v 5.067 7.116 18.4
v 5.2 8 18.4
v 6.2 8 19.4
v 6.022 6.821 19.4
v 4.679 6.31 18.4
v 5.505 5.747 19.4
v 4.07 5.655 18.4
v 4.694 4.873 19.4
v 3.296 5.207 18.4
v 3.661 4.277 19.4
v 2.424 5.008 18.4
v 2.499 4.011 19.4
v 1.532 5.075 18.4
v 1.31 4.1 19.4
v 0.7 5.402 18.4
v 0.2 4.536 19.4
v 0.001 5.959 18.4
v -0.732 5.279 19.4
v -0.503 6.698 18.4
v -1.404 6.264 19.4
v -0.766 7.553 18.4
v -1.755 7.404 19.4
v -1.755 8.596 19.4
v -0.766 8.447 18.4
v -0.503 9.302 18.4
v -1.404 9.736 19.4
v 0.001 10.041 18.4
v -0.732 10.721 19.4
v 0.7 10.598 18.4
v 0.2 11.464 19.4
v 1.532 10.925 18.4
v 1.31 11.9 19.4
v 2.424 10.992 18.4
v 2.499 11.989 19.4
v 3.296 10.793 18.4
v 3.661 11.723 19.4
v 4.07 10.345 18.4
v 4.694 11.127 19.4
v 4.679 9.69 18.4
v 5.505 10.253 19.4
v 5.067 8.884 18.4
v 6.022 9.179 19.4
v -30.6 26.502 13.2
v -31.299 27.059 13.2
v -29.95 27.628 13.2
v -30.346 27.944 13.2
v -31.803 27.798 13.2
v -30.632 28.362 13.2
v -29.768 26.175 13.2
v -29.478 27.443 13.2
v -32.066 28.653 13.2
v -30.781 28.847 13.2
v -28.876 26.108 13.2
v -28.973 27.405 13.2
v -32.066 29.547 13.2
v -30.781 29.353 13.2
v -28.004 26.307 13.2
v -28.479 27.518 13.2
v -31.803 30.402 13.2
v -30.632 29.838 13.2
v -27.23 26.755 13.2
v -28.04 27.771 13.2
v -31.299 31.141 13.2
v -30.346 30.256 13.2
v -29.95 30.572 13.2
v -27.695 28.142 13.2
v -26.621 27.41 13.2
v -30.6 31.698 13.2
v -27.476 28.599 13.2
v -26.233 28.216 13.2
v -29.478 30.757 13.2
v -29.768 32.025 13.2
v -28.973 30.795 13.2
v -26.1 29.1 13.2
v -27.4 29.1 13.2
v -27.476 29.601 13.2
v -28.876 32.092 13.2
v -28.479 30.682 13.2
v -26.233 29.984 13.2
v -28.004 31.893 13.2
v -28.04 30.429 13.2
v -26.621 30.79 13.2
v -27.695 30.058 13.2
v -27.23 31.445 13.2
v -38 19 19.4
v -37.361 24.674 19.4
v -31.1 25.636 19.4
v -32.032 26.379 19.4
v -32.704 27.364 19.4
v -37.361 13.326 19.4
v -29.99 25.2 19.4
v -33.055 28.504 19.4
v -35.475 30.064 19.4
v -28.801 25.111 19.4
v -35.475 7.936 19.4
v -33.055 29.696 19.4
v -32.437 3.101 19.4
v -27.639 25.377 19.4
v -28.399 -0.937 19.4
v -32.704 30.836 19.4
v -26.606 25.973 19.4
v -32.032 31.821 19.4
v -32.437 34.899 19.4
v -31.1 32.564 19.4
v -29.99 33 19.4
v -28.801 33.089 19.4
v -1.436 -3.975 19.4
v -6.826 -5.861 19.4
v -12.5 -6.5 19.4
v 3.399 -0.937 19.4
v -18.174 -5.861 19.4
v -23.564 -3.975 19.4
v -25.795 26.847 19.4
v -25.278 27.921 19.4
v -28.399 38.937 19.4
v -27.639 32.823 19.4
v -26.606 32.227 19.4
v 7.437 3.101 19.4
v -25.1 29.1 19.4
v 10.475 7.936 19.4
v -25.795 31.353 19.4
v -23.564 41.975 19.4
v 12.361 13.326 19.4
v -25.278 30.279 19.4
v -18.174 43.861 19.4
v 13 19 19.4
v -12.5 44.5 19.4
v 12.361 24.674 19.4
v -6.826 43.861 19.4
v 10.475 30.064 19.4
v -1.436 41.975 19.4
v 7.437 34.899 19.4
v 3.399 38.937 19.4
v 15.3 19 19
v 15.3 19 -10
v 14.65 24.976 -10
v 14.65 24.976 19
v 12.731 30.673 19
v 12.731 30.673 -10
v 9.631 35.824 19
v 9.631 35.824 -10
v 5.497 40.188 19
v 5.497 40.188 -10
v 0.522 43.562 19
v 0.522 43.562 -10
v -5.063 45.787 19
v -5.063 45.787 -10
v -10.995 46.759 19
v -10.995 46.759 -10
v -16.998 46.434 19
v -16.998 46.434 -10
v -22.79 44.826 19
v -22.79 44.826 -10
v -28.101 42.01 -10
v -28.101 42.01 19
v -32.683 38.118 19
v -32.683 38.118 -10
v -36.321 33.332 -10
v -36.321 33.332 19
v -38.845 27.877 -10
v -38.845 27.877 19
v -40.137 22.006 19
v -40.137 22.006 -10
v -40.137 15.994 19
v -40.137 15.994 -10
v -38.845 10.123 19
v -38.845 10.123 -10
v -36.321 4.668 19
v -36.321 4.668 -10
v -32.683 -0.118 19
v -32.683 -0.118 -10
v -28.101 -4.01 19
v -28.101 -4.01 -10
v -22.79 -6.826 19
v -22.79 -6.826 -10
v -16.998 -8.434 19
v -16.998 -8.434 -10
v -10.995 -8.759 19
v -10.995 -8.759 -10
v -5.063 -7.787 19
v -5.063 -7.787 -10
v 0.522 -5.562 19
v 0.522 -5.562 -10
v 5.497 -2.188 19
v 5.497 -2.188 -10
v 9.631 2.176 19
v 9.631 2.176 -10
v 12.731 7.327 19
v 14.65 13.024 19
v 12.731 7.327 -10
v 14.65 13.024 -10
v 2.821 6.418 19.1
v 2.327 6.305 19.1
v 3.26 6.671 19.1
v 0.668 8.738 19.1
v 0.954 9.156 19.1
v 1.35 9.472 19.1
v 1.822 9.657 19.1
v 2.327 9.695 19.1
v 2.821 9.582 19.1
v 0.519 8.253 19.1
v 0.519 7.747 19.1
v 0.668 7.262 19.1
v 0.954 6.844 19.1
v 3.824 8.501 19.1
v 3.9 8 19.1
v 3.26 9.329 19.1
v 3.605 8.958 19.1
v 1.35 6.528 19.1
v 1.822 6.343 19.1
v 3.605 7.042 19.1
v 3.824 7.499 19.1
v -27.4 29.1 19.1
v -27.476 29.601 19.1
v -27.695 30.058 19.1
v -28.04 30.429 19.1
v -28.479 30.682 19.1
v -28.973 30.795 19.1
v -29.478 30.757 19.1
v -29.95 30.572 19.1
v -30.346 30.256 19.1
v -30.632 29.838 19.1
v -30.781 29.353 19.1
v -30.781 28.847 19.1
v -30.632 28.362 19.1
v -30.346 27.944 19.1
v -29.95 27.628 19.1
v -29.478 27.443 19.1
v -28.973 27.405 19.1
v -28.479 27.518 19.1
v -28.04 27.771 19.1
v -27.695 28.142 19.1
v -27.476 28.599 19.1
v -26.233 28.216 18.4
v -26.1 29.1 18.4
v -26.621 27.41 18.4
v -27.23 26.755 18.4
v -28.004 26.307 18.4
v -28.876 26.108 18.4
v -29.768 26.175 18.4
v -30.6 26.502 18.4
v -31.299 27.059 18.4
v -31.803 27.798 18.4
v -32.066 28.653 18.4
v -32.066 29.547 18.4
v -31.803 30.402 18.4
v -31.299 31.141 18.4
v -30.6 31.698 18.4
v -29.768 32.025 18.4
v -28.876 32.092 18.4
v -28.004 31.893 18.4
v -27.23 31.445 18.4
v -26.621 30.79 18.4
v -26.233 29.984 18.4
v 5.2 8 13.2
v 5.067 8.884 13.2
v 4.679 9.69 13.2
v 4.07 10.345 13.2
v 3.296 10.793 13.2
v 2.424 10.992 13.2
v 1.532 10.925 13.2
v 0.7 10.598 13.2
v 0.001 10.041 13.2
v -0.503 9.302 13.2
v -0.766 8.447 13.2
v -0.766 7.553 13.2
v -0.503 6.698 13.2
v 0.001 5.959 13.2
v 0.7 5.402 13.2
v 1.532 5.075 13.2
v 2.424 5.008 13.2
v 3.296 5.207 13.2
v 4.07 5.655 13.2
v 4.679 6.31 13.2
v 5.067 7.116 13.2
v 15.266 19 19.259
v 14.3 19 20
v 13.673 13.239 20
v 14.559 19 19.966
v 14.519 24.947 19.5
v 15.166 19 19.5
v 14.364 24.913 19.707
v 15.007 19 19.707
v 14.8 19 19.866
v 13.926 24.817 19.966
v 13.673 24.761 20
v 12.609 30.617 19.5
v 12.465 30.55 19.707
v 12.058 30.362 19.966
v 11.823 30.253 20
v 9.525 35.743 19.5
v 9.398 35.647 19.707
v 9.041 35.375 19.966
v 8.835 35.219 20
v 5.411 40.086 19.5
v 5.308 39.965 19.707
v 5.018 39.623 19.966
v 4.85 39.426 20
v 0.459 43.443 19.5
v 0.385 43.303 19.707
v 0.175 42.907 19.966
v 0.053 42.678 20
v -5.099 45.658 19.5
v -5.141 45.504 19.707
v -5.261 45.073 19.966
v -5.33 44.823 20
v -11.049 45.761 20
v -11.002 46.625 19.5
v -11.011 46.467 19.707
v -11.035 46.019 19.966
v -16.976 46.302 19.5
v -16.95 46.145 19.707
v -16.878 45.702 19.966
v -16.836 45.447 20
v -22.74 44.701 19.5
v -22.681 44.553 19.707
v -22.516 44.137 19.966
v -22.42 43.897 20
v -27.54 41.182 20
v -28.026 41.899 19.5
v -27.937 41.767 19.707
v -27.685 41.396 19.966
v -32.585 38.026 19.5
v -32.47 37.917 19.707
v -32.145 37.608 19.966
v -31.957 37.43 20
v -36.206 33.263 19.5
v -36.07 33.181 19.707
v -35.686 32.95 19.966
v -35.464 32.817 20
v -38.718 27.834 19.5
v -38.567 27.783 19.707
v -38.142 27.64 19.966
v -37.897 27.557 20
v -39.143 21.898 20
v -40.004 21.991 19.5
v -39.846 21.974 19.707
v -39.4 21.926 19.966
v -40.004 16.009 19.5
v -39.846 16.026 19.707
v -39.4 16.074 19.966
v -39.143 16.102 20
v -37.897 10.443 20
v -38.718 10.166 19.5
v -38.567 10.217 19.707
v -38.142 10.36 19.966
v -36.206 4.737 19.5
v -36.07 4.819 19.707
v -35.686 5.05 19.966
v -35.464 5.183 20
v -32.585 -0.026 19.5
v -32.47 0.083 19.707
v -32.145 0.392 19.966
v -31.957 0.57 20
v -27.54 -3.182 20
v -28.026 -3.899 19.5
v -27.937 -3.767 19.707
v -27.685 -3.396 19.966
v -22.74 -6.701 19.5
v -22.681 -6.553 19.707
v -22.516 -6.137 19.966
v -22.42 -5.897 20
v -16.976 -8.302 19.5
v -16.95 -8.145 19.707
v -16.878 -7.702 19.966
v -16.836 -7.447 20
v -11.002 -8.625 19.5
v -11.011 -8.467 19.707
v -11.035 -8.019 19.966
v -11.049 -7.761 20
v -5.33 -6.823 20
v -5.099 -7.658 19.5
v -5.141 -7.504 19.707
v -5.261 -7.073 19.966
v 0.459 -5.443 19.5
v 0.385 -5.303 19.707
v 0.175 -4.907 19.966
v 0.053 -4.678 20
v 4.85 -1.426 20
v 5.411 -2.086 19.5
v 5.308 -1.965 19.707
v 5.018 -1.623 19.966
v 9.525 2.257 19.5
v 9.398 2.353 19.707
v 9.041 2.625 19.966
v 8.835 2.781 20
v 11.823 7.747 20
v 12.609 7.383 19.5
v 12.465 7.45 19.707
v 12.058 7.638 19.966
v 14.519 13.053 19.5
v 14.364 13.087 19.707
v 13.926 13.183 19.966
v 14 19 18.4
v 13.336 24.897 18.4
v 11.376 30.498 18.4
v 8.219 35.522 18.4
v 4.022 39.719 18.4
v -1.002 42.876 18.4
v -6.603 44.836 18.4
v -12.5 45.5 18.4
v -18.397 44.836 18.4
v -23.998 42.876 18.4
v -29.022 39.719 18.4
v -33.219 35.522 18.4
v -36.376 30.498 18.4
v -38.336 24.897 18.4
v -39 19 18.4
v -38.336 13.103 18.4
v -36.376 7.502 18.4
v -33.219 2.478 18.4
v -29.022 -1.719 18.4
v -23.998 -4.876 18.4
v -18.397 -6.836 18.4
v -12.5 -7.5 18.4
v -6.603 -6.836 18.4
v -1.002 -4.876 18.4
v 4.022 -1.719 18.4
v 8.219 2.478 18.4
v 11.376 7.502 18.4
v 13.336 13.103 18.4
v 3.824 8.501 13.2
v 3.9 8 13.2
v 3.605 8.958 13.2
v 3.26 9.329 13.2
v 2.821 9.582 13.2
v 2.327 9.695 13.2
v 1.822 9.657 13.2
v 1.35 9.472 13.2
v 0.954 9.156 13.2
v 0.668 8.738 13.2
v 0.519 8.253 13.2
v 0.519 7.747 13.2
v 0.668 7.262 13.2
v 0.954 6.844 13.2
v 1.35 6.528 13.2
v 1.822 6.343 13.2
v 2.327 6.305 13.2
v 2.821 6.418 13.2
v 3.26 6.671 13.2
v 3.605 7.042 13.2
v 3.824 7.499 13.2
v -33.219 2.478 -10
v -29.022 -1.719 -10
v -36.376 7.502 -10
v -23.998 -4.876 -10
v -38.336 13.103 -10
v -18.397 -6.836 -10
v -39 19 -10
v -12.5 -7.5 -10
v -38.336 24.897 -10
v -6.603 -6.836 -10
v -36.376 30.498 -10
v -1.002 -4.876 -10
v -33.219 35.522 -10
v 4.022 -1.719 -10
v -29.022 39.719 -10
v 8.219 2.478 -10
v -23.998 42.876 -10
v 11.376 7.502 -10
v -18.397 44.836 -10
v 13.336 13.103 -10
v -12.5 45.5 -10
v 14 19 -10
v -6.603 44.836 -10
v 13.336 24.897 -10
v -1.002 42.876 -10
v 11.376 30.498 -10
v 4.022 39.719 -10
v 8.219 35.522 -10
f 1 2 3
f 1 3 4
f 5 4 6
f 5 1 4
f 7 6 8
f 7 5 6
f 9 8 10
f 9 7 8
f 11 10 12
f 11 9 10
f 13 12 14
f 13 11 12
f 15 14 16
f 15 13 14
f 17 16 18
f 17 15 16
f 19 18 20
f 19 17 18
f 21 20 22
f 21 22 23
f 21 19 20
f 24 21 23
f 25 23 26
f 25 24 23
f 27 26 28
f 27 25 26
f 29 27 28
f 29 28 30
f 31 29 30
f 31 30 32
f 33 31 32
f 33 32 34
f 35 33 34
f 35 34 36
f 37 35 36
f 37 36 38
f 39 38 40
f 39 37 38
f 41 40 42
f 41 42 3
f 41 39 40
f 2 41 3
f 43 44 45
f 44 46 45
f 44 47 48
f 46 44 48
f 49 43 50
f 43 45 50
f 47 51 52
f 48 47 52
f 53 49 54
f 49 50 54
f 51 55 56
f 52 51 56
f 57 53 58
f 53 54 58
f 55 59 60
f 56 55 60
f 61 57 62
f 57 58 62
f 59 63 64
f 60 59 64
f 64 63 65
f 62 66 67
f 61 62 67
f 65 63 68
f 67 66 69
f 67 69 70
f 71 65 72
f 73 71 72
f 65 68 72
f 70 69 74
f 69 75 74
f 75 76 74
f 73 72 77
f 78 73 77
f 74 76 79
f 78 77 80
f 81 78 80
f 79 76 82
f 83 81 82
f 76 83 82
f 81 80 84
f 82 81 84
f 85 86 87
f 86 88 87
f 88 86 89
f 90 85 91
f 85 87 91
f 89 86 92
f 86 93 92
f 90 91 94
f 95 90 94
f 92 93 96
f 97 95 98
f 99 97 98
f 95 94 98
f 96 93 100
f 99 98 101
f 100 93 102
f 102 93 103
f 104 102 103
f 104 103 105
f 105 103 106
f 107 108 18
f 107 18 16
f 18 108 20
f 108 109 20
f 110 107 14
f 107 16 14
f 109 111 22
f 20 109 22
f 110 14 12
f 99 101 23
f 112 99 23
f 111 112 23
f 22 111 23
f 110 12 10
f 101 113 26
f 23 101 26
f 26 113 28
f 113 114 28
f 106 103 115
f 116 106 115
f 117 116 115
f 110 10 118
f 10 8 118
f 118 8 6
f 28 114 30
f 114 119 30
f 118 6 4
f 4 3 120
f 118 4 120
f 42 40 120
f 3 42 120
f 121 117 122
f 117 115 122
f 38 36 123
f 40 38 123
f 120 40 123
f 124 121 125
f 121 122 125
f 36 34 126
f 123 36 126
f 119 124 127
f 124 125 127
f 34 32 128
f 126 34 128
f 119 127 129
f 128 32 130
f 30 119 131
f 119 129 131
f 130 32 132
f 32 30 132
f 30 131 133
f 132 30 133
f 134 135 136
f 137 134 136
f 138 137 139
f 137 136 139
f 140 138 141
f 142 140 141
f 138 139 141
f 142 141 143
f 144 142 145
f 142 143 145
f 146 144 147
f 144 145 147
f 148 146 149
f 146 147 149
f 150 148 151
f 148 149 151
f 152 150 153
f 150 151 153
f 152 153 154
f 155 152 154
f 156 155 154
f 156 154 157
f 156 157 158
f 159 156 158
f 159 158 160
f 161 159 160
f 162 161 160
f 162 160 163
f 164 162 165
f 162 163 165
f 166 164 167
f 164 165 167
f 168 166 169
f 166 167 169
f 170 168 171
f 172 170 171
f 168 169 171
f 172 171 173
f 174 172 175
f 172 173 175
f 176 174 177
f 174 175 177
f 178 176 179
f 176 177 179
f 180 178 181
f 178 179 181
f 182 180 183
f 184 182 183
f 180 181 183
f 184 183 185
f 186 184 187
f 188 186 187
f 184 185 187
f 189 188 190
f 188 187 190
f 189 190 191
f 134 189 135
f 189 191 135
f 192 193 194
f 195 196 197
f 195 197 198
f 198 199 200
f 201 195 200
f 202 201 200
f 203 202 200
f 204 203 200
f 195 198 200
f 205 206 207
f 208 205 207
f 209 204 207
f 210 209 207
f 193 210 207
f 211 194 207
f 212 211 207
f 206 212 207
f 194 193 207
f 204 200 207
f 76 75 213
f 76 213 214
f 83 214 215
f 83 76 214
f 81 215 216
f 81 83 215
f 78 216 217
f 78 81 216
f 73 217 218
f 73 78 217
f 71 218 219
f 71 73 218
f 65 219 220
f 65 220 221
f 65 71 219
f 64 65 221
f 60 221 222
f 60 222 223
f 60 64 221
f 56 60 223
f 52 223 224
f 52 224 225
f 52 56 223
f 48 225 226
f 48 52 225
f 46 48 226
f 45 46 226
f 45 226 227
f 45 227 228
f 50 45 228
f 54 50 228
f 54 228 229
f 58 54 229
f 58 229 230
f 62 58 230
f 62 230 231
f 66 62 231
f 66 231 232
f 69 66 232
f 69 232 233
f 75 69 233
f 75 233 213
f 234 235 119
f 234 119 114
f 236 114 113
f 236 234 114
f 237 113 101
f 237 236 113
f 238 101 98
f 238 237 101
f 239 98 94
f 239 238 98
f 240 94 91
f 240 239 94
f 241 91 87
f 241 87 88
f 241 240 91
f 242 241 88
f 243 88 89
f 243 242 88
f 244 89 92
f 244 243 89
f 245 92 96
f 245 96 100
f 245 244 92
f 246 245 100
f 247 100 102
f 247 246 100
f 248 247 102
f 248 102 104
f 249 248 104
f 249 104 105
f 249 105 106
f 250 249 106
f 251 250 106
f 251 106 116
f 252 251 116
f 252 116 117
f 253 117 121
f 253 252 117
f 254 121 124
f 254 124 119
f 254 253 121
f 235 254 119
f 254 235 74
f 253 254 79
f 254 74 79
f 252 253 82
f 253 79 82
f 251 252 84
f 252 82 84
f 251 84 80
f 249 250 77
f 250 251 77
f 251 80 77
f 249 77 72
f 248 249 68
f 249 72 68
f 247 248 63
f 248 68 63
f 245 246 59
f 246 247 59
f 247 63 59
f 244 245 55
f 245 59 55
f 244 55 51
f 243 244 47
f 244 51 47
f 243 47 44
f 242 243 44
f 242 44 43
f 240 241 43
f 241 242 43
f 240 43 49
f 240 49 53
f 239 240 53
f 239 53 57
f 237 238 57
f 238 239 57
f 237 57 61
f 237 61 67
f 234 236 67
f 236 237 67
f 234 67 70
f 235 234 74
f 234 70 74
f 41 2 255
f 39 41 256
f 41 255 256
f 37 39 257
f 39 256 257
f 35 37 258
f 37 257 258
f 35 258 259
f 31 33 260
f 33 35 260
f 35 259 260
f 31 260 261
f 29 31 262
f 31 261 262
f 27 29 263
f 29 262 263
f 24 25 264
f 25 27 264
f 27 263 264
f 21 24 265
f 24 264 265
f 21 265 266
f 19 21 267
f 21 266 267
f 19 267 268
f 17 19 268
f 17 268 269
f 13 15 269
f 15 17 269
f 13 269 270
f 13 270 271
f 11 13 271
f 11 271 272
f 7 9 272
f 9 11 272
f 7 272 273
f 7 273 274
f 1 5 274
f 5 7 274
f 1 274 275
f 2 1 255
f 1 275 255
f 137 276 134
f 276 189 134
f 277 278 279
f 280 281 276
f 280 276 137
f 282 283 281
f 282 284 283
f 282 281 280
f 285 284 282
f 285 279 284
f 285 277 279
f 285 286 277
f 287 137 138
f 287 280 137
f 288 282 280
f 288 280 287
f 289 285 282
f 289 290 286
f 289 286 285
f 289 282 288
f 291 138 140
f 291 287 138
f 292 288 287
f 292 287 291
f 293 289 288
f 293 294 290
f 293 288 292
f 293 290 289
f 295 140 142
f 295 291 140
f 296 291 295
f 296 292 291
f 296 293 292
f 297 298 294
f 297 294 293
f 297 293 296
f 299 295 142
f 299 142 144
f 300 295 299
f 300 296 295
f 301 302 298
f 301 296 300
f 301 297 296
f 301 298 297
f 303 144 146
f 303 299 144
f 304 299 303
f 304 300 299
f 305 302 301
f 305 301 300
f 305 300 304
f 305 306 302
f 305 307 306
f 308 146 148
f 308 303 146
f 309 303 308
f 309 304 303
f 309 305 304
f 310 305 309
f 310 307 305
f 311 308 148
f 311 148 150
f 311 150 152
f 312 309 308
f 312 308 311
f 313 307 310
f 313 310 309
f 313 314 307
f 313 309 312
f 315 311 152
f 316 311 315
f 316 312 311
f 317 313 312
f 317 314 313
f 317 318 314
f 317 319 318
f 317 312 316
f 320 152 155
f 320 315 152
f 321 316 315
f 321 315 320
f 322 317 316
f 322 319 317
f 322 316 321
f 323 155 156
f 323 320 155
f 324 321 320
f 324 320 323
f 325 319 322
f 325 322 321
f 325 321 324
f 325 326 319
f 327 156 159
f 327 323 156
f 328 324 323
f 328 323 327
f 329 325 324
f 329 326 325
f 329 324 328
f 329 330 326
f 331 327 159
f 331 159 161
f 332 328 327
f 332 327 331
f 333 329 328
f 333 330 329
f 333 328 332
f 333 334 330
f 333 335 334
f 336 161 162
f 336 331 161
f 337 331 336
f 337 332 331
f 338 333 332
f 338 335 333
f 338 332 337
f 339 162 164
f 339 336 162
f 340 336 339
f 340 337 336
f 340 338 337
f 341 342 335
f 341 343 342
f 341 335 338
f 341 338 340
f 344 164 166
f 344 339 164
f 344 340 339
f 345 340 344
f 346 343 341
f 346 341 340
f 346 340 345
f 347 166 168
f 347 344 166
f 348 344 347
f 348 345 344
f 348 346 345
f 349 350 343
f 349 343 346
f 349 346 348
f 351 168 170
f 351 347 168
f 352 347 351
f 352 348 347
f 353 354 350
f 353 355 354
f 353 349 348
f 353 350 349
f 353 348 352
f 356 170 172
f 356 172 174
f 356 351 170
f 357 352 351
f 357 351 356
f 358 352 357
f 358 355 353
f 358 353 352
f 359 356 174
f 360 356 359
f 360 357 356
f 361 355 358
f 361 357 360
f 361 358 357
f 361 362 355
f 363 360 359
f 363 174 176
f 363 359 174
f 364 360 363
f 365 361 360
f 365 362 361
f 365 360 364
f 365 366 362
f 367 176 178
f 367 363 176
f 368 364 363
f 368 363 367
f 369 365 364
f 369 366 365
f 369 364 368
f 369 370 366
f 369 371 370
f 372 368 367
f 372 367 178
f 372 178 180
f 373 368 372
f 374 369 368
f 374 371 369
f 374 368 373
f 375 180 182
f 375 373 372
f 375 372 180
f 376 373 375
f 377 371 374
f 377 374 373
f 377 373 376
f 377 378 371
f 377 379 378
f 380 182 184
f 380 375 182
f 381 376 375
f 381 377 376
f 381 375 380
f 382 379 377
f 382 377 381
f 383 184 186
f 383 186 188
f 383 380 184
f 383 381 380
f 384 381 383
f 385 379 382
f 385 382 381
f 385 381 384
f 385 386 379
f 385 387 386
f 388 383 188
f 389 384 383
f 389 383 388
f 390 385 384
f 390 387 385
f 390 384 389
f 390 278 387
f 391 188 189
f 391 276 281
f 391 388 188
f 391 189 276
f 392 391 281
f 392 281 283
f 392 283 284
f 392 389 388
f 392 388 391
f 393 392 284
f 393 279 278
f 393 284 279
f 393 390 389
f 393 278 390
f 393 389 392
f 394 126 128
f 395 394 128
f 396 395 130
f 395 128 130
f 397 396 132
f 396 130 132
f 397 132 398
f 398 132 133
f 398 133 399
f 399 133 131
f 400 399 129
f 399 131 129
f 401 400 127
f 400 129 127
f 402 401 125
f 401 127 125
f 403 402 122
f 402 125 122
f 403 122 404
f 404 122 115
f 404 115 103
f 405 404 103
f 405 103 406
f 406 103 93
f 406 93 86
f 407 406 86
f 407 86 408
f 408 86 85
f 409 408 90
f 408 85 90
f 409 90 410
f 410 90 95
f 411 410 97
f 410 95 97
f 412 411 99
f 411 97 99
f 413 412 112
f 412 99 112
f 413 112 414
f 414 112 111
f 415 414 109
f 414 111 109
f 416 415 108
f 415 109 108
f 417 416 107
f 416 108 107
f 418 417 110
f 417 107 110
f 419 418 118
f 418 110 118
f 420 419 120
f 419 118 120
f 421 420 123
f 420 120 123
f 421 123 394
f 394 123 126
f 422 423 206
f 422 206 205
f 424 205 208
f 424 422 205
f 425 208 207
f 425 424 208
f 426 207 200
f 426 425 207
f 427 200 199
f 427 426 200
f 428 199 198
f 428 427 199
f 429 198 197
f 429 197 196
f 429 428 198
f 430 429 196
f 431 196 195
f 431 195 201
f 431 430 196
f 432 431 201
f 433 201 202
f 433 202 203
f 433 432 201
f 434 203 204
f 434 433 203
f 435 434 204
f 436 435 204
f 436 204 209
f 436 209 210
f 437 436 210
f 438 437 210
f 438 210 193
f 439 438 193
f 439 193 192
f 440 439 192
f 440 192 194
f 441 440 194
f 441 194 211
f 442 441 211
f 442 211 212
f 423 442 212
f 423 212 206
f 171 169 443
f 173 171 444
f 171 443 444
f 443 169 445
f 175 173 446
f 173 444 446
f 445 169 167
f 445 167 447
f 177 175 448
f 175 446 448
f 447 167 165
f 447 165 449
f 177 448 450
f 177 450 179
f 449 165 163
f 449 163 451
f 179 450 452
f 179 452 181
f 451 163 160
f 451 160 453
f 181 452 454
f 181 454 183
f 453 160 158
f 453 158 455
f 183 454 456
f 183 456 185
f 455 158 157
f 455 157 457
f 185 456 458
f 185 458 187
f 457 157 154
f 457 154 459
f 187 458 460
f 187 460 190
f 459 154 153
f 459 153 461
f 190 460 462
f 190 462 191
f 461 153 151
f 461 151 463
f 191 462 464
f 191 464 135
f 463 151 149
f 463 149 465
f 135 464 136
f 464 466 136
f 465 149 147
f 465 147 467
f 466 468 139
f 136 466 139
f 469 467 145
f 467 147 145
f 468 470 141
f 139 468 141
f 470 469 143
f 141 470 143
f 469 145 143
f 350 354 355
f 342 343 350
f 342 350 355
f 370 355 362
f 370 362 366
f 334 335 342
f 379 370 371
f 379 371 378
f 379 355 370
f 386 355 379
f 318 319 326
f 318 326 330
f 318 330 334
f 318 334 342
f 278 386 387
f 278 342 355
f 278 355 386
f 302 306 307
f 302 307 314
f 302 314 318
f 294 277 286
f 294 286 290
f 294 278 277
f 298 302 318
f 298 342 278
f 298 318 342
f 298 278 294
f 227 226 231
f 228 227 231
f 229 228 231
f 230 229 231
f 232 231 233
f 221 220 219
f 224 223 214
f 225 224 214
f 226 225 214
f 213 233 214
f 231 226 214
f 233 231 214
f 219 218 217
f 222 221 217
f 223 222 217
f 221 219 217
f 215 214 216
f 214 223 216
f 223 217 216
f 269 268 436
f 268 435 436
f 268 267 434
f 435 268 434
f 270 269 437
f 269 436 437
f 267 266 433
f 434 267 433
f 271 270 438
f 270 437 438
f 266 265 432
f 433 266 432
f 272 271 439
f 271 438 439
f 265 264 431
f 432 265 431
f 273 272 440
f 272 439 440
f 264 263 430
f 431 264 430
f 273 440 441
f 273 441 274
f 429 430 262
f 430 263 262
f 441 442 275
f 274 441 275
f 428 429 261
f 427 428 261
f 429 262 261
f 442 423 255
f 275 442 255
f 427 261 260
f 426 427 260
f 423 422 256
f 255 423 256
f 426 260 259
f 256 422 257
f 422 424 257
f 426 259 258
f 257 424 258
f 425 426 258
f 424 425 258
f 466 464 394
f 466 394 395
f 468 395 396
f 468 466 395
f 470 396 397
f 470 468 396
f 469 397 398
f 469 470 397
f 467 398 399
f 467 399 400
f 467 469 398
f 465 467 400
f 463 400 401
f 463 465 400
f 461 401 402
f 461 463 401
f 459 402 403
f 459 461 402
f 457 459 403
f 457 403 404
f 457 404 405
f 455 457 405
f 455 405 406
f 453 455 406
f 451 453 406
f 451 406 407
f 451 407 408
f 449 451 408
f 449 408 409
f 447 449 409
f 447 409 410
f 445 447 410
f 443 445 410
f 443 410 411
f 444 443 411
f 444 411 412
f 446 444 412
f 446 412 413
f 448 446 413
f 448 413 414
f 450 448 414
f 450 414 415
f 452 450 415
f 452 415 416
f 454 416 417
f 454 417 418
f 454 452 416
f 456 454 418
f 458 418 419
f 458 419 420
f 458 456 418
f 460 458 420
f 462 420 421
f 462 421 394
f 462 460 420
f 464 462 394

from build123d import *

# Parameters (mm, degrees)
CYLINDER004_R     = 1.7
CYLINDER004_DEPTH = 6.5
CYLINDER002_R     = 3
CYLINDER002_DEPTH = 6.5
CYLINDER_R        = 26.5
CYLINDER_DEPTH    = 30
CYLINDER001_R     = 27.8
CYLINDER001_DEPTH = 30
CYLINDER005_R     = 1.7
CYLINDER005_DEPTH = 6.5
CYLINDER003_R     = 3
CYLINDER003_DEPTH = 6.5
CHAMFER_SIZE      = 1
FILLET_R          = 1


with BuildPart() as vaciado_tope1:
    # Cylinder004 → Cylinder004 (new body)
    with BuildSketch(Plane(origin=(2.2, 8, -3.4), x_dir=(1, 0, 0), z_dir=(0, 0, 1))):
        Circle(CYLINDER004_R)
    extrude(amount=CYLINDER004_DEPTH)


with BuildPart() as cut001:
    # Cylinder002 → Cylinder002 (new body)
    with BuildSketch(Plane(origin=(2.2, 8, -2.8), x_dir=(1, 0, 0), z_dir=(0, 0, 1))):
        Circle(CYLINDER002_R)
    extrude(amount=CYLINDER002_DEPTH)

    # Cut001: cut vaciado tope1
    add(vaciado_tope1.part, mode=Mode.SUBTRACT)


with BuildPart() as cut001_1:
    # Cut001 placement: moved
    add(cut001.part.moved(Location((0, 0, 16))))


with BuildPart() as base_exterior_vaciado:
    # Cylinder → Cylinder (new body)
    with BuildSketch(Plane(origin=(-12.5, 19, -10.6), x_dir=(1, 0, 0), z_dir=(0, 0, 1))):
        Circle(CYLINDER_R)
    extrude(amount=CYLINDER_DEPTH)


with BuildPart() as cut:
    # Cylinder001 → Cylinder001 (new body)
    with BuildSketch(Plane(origin=(-12.5, 19, -10), x_dir=(1, 0, 0), z_dir=(0, 0, 1))):
        Circle(CYLINDER001_R)
    extrude(amount=CYLINDER001_DEPTH)

    # Cut: cut base exterior vaciado
    add(base_exterior_vaciado.part, mode=Mode.SUBTRACT)


with BuildPart() as vaciado_tope2:
    # Cylinder005 → Cylinder005 (new body)
    with BuildSketch(Plane(origin=(-29.1, 29.1, -3.4), x_dir=(1, 0, 0), z_dir=(0, 0, 1))):
        Circle(CYLINDER005_R)
    extrude(amount=CYLINDER005_DEPTH)


with BuildPart() as base_dise_o_alto:
    # Cylinder003 → Cylinder003 (new body)
    with BuildSketch(Plane(origin=(-29.1, 29.1, -2.8), x_dir=(1, 0, 0), z_dir=(0, 0, 1))):
        Circle(CYLINDER003_R)
    extrude(amount=CYLINDER003_DEPTH)

    # Cut002: cut vaciado tope2
    add(vaciado_tope2.part, mode=Mode.SUBTRACT)


with BuildPart() as base_dise_o_alto_1:
    # Cut002 placement: moved
    add(base_dise_o_alto.part.moved(Location((0, 0, 16))))

    # Fusion: union Cut001, Cut
    add(cut001_1.part)
    add(cut.part)

    # Chamfer
    chamfer_edges = [base_dise_o_alto_1.edges().sort_by_distance(p)[0] for p in [
        (-32.1, 29.1, 19.4),
        (-39, 19, 19.4),
        (-0.8, 8, 19.4),
    ]]
    chamfer(chamfer_edges, length=CHAMFER_SIZE)

    # Fillet
    fillet_edges = [base_dise_o_alto_1.edges().sort_by_distance(p)[0] for p in [
        (-40.3, 19, 20),
    ]]
    fillet(fillet_edges, radius=FILLET_R)


solid = base_dise_o_alto_1.part
